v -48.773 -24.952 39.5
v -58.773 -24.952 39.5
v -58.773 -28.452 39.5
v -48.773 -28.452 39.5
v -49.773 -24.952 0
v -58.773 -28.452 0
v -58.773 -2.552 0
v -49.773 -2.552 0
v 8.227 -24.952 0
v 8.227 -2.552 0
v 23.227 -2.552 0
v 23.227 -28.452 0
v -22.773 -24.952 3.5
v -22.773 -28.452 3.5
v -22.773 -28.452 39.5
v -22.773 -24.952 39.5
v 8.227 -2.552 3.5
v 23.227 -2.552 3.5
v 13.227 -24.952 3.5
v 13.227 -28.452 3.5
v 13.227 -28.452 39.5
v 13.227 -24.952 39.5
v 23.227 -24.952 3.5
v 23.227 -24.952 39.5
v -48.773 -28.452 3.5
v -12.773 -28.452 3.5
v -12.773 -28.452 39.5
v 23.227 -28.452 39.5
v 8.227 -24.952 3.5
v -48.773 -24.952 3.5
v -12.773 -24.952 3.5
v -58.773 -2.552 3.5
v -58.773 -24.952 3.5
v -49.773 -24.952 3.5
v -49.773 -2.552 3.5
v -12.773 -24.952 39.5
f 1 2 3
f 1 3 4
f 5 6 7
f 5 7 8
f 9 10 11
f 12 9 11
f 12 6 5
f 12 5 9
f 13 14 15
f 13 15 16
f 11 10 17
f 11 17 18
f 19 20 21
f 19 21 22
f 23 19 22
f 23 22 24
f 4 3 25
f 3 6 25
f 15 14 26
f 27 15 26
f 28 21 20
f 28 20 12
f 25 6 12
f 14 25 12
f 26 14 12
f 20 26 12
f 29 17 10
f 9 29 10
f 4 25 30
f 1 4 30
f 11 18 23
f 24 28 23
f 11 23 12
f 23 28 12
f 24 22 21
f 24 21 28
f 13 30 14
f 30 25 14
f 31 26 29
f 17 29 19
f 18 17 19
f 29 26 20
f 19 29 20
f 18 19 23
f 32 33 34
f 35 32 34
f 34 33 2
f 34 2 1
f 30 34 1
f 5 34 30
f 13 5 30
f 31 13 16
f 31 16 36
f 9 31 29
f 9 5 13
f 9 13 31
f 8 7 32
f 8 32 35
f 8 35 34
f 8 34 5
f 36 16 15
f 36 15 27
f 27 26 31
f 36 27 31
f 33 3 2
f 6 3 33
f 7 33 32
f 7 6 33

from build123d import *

# Parameters (mm, degrees)
CROQUIS1_W              = 82
CROQUIS1_H              = 3.5
SALIENTE_EXTRUIR1_DEPTH = 3.5
CROQUIS2_W              = 15
CROQUIS2_H              = 3.5
CROQUIS2_W_2            = 9
SALIENTE_EXTRUIR2_DEPTH = 22.4
CROQUIS3_W              = 10
CROQUIS3_H              = 3.5
SALIENTE_EXTRUIR3_DEPTH = 36


with BuildPart() as part:
    # Croquis1 → Saliente-Extruir1 (new body)
    with BuildSketch(Plane.XY):
        with Locations((-17.772529993, -26.701946472)):
            Rectangle(CROQUIS1_W, CROQUIS1_H)
    extrude(amount=SALIENTE_EXTRUIR1_DEPTH)

    # Croquis2 → Saliente-Extruir2 (add)
    with BuildSketch(Plane(origin=(0, -24.951946472, 0), x_dir=(1, 0, 0), z_dir=(0, 1, 0))):
        with Locations((15.727470007, -1.75)):
            Rectangle(CROQUIS2_W, CROQUIS2_H)
        with Locations((-54.272529993, -1.75)):
            Rectangle(CROQUIS2_W_2, CROQUIS2_H)
    extrude(amount=SALIENTE_EXTRUIR2_DEPTH)

    # Croquis3 → Saliente-Extruir3 (add)
    with BuildSketch(Plane.XY.offset(3.5)):
        with Locations((-53.772529993, -26.701946472)):
            Rectangle(CROQUIS3_W, CROQUIS3_H)
        with Locations((-17.772529993, -26.701946472)):
            Rectangle(CROQUIS3_W, CROQUIS3_H)
        with Locations((18.227470007, -26.701946472)):
            Rectangle(CROQUIS3_W, CROQUIS3_H)
    extrude(amount=SALIENTE_EXTRUIR3_DEPTH)


solid = part.part
